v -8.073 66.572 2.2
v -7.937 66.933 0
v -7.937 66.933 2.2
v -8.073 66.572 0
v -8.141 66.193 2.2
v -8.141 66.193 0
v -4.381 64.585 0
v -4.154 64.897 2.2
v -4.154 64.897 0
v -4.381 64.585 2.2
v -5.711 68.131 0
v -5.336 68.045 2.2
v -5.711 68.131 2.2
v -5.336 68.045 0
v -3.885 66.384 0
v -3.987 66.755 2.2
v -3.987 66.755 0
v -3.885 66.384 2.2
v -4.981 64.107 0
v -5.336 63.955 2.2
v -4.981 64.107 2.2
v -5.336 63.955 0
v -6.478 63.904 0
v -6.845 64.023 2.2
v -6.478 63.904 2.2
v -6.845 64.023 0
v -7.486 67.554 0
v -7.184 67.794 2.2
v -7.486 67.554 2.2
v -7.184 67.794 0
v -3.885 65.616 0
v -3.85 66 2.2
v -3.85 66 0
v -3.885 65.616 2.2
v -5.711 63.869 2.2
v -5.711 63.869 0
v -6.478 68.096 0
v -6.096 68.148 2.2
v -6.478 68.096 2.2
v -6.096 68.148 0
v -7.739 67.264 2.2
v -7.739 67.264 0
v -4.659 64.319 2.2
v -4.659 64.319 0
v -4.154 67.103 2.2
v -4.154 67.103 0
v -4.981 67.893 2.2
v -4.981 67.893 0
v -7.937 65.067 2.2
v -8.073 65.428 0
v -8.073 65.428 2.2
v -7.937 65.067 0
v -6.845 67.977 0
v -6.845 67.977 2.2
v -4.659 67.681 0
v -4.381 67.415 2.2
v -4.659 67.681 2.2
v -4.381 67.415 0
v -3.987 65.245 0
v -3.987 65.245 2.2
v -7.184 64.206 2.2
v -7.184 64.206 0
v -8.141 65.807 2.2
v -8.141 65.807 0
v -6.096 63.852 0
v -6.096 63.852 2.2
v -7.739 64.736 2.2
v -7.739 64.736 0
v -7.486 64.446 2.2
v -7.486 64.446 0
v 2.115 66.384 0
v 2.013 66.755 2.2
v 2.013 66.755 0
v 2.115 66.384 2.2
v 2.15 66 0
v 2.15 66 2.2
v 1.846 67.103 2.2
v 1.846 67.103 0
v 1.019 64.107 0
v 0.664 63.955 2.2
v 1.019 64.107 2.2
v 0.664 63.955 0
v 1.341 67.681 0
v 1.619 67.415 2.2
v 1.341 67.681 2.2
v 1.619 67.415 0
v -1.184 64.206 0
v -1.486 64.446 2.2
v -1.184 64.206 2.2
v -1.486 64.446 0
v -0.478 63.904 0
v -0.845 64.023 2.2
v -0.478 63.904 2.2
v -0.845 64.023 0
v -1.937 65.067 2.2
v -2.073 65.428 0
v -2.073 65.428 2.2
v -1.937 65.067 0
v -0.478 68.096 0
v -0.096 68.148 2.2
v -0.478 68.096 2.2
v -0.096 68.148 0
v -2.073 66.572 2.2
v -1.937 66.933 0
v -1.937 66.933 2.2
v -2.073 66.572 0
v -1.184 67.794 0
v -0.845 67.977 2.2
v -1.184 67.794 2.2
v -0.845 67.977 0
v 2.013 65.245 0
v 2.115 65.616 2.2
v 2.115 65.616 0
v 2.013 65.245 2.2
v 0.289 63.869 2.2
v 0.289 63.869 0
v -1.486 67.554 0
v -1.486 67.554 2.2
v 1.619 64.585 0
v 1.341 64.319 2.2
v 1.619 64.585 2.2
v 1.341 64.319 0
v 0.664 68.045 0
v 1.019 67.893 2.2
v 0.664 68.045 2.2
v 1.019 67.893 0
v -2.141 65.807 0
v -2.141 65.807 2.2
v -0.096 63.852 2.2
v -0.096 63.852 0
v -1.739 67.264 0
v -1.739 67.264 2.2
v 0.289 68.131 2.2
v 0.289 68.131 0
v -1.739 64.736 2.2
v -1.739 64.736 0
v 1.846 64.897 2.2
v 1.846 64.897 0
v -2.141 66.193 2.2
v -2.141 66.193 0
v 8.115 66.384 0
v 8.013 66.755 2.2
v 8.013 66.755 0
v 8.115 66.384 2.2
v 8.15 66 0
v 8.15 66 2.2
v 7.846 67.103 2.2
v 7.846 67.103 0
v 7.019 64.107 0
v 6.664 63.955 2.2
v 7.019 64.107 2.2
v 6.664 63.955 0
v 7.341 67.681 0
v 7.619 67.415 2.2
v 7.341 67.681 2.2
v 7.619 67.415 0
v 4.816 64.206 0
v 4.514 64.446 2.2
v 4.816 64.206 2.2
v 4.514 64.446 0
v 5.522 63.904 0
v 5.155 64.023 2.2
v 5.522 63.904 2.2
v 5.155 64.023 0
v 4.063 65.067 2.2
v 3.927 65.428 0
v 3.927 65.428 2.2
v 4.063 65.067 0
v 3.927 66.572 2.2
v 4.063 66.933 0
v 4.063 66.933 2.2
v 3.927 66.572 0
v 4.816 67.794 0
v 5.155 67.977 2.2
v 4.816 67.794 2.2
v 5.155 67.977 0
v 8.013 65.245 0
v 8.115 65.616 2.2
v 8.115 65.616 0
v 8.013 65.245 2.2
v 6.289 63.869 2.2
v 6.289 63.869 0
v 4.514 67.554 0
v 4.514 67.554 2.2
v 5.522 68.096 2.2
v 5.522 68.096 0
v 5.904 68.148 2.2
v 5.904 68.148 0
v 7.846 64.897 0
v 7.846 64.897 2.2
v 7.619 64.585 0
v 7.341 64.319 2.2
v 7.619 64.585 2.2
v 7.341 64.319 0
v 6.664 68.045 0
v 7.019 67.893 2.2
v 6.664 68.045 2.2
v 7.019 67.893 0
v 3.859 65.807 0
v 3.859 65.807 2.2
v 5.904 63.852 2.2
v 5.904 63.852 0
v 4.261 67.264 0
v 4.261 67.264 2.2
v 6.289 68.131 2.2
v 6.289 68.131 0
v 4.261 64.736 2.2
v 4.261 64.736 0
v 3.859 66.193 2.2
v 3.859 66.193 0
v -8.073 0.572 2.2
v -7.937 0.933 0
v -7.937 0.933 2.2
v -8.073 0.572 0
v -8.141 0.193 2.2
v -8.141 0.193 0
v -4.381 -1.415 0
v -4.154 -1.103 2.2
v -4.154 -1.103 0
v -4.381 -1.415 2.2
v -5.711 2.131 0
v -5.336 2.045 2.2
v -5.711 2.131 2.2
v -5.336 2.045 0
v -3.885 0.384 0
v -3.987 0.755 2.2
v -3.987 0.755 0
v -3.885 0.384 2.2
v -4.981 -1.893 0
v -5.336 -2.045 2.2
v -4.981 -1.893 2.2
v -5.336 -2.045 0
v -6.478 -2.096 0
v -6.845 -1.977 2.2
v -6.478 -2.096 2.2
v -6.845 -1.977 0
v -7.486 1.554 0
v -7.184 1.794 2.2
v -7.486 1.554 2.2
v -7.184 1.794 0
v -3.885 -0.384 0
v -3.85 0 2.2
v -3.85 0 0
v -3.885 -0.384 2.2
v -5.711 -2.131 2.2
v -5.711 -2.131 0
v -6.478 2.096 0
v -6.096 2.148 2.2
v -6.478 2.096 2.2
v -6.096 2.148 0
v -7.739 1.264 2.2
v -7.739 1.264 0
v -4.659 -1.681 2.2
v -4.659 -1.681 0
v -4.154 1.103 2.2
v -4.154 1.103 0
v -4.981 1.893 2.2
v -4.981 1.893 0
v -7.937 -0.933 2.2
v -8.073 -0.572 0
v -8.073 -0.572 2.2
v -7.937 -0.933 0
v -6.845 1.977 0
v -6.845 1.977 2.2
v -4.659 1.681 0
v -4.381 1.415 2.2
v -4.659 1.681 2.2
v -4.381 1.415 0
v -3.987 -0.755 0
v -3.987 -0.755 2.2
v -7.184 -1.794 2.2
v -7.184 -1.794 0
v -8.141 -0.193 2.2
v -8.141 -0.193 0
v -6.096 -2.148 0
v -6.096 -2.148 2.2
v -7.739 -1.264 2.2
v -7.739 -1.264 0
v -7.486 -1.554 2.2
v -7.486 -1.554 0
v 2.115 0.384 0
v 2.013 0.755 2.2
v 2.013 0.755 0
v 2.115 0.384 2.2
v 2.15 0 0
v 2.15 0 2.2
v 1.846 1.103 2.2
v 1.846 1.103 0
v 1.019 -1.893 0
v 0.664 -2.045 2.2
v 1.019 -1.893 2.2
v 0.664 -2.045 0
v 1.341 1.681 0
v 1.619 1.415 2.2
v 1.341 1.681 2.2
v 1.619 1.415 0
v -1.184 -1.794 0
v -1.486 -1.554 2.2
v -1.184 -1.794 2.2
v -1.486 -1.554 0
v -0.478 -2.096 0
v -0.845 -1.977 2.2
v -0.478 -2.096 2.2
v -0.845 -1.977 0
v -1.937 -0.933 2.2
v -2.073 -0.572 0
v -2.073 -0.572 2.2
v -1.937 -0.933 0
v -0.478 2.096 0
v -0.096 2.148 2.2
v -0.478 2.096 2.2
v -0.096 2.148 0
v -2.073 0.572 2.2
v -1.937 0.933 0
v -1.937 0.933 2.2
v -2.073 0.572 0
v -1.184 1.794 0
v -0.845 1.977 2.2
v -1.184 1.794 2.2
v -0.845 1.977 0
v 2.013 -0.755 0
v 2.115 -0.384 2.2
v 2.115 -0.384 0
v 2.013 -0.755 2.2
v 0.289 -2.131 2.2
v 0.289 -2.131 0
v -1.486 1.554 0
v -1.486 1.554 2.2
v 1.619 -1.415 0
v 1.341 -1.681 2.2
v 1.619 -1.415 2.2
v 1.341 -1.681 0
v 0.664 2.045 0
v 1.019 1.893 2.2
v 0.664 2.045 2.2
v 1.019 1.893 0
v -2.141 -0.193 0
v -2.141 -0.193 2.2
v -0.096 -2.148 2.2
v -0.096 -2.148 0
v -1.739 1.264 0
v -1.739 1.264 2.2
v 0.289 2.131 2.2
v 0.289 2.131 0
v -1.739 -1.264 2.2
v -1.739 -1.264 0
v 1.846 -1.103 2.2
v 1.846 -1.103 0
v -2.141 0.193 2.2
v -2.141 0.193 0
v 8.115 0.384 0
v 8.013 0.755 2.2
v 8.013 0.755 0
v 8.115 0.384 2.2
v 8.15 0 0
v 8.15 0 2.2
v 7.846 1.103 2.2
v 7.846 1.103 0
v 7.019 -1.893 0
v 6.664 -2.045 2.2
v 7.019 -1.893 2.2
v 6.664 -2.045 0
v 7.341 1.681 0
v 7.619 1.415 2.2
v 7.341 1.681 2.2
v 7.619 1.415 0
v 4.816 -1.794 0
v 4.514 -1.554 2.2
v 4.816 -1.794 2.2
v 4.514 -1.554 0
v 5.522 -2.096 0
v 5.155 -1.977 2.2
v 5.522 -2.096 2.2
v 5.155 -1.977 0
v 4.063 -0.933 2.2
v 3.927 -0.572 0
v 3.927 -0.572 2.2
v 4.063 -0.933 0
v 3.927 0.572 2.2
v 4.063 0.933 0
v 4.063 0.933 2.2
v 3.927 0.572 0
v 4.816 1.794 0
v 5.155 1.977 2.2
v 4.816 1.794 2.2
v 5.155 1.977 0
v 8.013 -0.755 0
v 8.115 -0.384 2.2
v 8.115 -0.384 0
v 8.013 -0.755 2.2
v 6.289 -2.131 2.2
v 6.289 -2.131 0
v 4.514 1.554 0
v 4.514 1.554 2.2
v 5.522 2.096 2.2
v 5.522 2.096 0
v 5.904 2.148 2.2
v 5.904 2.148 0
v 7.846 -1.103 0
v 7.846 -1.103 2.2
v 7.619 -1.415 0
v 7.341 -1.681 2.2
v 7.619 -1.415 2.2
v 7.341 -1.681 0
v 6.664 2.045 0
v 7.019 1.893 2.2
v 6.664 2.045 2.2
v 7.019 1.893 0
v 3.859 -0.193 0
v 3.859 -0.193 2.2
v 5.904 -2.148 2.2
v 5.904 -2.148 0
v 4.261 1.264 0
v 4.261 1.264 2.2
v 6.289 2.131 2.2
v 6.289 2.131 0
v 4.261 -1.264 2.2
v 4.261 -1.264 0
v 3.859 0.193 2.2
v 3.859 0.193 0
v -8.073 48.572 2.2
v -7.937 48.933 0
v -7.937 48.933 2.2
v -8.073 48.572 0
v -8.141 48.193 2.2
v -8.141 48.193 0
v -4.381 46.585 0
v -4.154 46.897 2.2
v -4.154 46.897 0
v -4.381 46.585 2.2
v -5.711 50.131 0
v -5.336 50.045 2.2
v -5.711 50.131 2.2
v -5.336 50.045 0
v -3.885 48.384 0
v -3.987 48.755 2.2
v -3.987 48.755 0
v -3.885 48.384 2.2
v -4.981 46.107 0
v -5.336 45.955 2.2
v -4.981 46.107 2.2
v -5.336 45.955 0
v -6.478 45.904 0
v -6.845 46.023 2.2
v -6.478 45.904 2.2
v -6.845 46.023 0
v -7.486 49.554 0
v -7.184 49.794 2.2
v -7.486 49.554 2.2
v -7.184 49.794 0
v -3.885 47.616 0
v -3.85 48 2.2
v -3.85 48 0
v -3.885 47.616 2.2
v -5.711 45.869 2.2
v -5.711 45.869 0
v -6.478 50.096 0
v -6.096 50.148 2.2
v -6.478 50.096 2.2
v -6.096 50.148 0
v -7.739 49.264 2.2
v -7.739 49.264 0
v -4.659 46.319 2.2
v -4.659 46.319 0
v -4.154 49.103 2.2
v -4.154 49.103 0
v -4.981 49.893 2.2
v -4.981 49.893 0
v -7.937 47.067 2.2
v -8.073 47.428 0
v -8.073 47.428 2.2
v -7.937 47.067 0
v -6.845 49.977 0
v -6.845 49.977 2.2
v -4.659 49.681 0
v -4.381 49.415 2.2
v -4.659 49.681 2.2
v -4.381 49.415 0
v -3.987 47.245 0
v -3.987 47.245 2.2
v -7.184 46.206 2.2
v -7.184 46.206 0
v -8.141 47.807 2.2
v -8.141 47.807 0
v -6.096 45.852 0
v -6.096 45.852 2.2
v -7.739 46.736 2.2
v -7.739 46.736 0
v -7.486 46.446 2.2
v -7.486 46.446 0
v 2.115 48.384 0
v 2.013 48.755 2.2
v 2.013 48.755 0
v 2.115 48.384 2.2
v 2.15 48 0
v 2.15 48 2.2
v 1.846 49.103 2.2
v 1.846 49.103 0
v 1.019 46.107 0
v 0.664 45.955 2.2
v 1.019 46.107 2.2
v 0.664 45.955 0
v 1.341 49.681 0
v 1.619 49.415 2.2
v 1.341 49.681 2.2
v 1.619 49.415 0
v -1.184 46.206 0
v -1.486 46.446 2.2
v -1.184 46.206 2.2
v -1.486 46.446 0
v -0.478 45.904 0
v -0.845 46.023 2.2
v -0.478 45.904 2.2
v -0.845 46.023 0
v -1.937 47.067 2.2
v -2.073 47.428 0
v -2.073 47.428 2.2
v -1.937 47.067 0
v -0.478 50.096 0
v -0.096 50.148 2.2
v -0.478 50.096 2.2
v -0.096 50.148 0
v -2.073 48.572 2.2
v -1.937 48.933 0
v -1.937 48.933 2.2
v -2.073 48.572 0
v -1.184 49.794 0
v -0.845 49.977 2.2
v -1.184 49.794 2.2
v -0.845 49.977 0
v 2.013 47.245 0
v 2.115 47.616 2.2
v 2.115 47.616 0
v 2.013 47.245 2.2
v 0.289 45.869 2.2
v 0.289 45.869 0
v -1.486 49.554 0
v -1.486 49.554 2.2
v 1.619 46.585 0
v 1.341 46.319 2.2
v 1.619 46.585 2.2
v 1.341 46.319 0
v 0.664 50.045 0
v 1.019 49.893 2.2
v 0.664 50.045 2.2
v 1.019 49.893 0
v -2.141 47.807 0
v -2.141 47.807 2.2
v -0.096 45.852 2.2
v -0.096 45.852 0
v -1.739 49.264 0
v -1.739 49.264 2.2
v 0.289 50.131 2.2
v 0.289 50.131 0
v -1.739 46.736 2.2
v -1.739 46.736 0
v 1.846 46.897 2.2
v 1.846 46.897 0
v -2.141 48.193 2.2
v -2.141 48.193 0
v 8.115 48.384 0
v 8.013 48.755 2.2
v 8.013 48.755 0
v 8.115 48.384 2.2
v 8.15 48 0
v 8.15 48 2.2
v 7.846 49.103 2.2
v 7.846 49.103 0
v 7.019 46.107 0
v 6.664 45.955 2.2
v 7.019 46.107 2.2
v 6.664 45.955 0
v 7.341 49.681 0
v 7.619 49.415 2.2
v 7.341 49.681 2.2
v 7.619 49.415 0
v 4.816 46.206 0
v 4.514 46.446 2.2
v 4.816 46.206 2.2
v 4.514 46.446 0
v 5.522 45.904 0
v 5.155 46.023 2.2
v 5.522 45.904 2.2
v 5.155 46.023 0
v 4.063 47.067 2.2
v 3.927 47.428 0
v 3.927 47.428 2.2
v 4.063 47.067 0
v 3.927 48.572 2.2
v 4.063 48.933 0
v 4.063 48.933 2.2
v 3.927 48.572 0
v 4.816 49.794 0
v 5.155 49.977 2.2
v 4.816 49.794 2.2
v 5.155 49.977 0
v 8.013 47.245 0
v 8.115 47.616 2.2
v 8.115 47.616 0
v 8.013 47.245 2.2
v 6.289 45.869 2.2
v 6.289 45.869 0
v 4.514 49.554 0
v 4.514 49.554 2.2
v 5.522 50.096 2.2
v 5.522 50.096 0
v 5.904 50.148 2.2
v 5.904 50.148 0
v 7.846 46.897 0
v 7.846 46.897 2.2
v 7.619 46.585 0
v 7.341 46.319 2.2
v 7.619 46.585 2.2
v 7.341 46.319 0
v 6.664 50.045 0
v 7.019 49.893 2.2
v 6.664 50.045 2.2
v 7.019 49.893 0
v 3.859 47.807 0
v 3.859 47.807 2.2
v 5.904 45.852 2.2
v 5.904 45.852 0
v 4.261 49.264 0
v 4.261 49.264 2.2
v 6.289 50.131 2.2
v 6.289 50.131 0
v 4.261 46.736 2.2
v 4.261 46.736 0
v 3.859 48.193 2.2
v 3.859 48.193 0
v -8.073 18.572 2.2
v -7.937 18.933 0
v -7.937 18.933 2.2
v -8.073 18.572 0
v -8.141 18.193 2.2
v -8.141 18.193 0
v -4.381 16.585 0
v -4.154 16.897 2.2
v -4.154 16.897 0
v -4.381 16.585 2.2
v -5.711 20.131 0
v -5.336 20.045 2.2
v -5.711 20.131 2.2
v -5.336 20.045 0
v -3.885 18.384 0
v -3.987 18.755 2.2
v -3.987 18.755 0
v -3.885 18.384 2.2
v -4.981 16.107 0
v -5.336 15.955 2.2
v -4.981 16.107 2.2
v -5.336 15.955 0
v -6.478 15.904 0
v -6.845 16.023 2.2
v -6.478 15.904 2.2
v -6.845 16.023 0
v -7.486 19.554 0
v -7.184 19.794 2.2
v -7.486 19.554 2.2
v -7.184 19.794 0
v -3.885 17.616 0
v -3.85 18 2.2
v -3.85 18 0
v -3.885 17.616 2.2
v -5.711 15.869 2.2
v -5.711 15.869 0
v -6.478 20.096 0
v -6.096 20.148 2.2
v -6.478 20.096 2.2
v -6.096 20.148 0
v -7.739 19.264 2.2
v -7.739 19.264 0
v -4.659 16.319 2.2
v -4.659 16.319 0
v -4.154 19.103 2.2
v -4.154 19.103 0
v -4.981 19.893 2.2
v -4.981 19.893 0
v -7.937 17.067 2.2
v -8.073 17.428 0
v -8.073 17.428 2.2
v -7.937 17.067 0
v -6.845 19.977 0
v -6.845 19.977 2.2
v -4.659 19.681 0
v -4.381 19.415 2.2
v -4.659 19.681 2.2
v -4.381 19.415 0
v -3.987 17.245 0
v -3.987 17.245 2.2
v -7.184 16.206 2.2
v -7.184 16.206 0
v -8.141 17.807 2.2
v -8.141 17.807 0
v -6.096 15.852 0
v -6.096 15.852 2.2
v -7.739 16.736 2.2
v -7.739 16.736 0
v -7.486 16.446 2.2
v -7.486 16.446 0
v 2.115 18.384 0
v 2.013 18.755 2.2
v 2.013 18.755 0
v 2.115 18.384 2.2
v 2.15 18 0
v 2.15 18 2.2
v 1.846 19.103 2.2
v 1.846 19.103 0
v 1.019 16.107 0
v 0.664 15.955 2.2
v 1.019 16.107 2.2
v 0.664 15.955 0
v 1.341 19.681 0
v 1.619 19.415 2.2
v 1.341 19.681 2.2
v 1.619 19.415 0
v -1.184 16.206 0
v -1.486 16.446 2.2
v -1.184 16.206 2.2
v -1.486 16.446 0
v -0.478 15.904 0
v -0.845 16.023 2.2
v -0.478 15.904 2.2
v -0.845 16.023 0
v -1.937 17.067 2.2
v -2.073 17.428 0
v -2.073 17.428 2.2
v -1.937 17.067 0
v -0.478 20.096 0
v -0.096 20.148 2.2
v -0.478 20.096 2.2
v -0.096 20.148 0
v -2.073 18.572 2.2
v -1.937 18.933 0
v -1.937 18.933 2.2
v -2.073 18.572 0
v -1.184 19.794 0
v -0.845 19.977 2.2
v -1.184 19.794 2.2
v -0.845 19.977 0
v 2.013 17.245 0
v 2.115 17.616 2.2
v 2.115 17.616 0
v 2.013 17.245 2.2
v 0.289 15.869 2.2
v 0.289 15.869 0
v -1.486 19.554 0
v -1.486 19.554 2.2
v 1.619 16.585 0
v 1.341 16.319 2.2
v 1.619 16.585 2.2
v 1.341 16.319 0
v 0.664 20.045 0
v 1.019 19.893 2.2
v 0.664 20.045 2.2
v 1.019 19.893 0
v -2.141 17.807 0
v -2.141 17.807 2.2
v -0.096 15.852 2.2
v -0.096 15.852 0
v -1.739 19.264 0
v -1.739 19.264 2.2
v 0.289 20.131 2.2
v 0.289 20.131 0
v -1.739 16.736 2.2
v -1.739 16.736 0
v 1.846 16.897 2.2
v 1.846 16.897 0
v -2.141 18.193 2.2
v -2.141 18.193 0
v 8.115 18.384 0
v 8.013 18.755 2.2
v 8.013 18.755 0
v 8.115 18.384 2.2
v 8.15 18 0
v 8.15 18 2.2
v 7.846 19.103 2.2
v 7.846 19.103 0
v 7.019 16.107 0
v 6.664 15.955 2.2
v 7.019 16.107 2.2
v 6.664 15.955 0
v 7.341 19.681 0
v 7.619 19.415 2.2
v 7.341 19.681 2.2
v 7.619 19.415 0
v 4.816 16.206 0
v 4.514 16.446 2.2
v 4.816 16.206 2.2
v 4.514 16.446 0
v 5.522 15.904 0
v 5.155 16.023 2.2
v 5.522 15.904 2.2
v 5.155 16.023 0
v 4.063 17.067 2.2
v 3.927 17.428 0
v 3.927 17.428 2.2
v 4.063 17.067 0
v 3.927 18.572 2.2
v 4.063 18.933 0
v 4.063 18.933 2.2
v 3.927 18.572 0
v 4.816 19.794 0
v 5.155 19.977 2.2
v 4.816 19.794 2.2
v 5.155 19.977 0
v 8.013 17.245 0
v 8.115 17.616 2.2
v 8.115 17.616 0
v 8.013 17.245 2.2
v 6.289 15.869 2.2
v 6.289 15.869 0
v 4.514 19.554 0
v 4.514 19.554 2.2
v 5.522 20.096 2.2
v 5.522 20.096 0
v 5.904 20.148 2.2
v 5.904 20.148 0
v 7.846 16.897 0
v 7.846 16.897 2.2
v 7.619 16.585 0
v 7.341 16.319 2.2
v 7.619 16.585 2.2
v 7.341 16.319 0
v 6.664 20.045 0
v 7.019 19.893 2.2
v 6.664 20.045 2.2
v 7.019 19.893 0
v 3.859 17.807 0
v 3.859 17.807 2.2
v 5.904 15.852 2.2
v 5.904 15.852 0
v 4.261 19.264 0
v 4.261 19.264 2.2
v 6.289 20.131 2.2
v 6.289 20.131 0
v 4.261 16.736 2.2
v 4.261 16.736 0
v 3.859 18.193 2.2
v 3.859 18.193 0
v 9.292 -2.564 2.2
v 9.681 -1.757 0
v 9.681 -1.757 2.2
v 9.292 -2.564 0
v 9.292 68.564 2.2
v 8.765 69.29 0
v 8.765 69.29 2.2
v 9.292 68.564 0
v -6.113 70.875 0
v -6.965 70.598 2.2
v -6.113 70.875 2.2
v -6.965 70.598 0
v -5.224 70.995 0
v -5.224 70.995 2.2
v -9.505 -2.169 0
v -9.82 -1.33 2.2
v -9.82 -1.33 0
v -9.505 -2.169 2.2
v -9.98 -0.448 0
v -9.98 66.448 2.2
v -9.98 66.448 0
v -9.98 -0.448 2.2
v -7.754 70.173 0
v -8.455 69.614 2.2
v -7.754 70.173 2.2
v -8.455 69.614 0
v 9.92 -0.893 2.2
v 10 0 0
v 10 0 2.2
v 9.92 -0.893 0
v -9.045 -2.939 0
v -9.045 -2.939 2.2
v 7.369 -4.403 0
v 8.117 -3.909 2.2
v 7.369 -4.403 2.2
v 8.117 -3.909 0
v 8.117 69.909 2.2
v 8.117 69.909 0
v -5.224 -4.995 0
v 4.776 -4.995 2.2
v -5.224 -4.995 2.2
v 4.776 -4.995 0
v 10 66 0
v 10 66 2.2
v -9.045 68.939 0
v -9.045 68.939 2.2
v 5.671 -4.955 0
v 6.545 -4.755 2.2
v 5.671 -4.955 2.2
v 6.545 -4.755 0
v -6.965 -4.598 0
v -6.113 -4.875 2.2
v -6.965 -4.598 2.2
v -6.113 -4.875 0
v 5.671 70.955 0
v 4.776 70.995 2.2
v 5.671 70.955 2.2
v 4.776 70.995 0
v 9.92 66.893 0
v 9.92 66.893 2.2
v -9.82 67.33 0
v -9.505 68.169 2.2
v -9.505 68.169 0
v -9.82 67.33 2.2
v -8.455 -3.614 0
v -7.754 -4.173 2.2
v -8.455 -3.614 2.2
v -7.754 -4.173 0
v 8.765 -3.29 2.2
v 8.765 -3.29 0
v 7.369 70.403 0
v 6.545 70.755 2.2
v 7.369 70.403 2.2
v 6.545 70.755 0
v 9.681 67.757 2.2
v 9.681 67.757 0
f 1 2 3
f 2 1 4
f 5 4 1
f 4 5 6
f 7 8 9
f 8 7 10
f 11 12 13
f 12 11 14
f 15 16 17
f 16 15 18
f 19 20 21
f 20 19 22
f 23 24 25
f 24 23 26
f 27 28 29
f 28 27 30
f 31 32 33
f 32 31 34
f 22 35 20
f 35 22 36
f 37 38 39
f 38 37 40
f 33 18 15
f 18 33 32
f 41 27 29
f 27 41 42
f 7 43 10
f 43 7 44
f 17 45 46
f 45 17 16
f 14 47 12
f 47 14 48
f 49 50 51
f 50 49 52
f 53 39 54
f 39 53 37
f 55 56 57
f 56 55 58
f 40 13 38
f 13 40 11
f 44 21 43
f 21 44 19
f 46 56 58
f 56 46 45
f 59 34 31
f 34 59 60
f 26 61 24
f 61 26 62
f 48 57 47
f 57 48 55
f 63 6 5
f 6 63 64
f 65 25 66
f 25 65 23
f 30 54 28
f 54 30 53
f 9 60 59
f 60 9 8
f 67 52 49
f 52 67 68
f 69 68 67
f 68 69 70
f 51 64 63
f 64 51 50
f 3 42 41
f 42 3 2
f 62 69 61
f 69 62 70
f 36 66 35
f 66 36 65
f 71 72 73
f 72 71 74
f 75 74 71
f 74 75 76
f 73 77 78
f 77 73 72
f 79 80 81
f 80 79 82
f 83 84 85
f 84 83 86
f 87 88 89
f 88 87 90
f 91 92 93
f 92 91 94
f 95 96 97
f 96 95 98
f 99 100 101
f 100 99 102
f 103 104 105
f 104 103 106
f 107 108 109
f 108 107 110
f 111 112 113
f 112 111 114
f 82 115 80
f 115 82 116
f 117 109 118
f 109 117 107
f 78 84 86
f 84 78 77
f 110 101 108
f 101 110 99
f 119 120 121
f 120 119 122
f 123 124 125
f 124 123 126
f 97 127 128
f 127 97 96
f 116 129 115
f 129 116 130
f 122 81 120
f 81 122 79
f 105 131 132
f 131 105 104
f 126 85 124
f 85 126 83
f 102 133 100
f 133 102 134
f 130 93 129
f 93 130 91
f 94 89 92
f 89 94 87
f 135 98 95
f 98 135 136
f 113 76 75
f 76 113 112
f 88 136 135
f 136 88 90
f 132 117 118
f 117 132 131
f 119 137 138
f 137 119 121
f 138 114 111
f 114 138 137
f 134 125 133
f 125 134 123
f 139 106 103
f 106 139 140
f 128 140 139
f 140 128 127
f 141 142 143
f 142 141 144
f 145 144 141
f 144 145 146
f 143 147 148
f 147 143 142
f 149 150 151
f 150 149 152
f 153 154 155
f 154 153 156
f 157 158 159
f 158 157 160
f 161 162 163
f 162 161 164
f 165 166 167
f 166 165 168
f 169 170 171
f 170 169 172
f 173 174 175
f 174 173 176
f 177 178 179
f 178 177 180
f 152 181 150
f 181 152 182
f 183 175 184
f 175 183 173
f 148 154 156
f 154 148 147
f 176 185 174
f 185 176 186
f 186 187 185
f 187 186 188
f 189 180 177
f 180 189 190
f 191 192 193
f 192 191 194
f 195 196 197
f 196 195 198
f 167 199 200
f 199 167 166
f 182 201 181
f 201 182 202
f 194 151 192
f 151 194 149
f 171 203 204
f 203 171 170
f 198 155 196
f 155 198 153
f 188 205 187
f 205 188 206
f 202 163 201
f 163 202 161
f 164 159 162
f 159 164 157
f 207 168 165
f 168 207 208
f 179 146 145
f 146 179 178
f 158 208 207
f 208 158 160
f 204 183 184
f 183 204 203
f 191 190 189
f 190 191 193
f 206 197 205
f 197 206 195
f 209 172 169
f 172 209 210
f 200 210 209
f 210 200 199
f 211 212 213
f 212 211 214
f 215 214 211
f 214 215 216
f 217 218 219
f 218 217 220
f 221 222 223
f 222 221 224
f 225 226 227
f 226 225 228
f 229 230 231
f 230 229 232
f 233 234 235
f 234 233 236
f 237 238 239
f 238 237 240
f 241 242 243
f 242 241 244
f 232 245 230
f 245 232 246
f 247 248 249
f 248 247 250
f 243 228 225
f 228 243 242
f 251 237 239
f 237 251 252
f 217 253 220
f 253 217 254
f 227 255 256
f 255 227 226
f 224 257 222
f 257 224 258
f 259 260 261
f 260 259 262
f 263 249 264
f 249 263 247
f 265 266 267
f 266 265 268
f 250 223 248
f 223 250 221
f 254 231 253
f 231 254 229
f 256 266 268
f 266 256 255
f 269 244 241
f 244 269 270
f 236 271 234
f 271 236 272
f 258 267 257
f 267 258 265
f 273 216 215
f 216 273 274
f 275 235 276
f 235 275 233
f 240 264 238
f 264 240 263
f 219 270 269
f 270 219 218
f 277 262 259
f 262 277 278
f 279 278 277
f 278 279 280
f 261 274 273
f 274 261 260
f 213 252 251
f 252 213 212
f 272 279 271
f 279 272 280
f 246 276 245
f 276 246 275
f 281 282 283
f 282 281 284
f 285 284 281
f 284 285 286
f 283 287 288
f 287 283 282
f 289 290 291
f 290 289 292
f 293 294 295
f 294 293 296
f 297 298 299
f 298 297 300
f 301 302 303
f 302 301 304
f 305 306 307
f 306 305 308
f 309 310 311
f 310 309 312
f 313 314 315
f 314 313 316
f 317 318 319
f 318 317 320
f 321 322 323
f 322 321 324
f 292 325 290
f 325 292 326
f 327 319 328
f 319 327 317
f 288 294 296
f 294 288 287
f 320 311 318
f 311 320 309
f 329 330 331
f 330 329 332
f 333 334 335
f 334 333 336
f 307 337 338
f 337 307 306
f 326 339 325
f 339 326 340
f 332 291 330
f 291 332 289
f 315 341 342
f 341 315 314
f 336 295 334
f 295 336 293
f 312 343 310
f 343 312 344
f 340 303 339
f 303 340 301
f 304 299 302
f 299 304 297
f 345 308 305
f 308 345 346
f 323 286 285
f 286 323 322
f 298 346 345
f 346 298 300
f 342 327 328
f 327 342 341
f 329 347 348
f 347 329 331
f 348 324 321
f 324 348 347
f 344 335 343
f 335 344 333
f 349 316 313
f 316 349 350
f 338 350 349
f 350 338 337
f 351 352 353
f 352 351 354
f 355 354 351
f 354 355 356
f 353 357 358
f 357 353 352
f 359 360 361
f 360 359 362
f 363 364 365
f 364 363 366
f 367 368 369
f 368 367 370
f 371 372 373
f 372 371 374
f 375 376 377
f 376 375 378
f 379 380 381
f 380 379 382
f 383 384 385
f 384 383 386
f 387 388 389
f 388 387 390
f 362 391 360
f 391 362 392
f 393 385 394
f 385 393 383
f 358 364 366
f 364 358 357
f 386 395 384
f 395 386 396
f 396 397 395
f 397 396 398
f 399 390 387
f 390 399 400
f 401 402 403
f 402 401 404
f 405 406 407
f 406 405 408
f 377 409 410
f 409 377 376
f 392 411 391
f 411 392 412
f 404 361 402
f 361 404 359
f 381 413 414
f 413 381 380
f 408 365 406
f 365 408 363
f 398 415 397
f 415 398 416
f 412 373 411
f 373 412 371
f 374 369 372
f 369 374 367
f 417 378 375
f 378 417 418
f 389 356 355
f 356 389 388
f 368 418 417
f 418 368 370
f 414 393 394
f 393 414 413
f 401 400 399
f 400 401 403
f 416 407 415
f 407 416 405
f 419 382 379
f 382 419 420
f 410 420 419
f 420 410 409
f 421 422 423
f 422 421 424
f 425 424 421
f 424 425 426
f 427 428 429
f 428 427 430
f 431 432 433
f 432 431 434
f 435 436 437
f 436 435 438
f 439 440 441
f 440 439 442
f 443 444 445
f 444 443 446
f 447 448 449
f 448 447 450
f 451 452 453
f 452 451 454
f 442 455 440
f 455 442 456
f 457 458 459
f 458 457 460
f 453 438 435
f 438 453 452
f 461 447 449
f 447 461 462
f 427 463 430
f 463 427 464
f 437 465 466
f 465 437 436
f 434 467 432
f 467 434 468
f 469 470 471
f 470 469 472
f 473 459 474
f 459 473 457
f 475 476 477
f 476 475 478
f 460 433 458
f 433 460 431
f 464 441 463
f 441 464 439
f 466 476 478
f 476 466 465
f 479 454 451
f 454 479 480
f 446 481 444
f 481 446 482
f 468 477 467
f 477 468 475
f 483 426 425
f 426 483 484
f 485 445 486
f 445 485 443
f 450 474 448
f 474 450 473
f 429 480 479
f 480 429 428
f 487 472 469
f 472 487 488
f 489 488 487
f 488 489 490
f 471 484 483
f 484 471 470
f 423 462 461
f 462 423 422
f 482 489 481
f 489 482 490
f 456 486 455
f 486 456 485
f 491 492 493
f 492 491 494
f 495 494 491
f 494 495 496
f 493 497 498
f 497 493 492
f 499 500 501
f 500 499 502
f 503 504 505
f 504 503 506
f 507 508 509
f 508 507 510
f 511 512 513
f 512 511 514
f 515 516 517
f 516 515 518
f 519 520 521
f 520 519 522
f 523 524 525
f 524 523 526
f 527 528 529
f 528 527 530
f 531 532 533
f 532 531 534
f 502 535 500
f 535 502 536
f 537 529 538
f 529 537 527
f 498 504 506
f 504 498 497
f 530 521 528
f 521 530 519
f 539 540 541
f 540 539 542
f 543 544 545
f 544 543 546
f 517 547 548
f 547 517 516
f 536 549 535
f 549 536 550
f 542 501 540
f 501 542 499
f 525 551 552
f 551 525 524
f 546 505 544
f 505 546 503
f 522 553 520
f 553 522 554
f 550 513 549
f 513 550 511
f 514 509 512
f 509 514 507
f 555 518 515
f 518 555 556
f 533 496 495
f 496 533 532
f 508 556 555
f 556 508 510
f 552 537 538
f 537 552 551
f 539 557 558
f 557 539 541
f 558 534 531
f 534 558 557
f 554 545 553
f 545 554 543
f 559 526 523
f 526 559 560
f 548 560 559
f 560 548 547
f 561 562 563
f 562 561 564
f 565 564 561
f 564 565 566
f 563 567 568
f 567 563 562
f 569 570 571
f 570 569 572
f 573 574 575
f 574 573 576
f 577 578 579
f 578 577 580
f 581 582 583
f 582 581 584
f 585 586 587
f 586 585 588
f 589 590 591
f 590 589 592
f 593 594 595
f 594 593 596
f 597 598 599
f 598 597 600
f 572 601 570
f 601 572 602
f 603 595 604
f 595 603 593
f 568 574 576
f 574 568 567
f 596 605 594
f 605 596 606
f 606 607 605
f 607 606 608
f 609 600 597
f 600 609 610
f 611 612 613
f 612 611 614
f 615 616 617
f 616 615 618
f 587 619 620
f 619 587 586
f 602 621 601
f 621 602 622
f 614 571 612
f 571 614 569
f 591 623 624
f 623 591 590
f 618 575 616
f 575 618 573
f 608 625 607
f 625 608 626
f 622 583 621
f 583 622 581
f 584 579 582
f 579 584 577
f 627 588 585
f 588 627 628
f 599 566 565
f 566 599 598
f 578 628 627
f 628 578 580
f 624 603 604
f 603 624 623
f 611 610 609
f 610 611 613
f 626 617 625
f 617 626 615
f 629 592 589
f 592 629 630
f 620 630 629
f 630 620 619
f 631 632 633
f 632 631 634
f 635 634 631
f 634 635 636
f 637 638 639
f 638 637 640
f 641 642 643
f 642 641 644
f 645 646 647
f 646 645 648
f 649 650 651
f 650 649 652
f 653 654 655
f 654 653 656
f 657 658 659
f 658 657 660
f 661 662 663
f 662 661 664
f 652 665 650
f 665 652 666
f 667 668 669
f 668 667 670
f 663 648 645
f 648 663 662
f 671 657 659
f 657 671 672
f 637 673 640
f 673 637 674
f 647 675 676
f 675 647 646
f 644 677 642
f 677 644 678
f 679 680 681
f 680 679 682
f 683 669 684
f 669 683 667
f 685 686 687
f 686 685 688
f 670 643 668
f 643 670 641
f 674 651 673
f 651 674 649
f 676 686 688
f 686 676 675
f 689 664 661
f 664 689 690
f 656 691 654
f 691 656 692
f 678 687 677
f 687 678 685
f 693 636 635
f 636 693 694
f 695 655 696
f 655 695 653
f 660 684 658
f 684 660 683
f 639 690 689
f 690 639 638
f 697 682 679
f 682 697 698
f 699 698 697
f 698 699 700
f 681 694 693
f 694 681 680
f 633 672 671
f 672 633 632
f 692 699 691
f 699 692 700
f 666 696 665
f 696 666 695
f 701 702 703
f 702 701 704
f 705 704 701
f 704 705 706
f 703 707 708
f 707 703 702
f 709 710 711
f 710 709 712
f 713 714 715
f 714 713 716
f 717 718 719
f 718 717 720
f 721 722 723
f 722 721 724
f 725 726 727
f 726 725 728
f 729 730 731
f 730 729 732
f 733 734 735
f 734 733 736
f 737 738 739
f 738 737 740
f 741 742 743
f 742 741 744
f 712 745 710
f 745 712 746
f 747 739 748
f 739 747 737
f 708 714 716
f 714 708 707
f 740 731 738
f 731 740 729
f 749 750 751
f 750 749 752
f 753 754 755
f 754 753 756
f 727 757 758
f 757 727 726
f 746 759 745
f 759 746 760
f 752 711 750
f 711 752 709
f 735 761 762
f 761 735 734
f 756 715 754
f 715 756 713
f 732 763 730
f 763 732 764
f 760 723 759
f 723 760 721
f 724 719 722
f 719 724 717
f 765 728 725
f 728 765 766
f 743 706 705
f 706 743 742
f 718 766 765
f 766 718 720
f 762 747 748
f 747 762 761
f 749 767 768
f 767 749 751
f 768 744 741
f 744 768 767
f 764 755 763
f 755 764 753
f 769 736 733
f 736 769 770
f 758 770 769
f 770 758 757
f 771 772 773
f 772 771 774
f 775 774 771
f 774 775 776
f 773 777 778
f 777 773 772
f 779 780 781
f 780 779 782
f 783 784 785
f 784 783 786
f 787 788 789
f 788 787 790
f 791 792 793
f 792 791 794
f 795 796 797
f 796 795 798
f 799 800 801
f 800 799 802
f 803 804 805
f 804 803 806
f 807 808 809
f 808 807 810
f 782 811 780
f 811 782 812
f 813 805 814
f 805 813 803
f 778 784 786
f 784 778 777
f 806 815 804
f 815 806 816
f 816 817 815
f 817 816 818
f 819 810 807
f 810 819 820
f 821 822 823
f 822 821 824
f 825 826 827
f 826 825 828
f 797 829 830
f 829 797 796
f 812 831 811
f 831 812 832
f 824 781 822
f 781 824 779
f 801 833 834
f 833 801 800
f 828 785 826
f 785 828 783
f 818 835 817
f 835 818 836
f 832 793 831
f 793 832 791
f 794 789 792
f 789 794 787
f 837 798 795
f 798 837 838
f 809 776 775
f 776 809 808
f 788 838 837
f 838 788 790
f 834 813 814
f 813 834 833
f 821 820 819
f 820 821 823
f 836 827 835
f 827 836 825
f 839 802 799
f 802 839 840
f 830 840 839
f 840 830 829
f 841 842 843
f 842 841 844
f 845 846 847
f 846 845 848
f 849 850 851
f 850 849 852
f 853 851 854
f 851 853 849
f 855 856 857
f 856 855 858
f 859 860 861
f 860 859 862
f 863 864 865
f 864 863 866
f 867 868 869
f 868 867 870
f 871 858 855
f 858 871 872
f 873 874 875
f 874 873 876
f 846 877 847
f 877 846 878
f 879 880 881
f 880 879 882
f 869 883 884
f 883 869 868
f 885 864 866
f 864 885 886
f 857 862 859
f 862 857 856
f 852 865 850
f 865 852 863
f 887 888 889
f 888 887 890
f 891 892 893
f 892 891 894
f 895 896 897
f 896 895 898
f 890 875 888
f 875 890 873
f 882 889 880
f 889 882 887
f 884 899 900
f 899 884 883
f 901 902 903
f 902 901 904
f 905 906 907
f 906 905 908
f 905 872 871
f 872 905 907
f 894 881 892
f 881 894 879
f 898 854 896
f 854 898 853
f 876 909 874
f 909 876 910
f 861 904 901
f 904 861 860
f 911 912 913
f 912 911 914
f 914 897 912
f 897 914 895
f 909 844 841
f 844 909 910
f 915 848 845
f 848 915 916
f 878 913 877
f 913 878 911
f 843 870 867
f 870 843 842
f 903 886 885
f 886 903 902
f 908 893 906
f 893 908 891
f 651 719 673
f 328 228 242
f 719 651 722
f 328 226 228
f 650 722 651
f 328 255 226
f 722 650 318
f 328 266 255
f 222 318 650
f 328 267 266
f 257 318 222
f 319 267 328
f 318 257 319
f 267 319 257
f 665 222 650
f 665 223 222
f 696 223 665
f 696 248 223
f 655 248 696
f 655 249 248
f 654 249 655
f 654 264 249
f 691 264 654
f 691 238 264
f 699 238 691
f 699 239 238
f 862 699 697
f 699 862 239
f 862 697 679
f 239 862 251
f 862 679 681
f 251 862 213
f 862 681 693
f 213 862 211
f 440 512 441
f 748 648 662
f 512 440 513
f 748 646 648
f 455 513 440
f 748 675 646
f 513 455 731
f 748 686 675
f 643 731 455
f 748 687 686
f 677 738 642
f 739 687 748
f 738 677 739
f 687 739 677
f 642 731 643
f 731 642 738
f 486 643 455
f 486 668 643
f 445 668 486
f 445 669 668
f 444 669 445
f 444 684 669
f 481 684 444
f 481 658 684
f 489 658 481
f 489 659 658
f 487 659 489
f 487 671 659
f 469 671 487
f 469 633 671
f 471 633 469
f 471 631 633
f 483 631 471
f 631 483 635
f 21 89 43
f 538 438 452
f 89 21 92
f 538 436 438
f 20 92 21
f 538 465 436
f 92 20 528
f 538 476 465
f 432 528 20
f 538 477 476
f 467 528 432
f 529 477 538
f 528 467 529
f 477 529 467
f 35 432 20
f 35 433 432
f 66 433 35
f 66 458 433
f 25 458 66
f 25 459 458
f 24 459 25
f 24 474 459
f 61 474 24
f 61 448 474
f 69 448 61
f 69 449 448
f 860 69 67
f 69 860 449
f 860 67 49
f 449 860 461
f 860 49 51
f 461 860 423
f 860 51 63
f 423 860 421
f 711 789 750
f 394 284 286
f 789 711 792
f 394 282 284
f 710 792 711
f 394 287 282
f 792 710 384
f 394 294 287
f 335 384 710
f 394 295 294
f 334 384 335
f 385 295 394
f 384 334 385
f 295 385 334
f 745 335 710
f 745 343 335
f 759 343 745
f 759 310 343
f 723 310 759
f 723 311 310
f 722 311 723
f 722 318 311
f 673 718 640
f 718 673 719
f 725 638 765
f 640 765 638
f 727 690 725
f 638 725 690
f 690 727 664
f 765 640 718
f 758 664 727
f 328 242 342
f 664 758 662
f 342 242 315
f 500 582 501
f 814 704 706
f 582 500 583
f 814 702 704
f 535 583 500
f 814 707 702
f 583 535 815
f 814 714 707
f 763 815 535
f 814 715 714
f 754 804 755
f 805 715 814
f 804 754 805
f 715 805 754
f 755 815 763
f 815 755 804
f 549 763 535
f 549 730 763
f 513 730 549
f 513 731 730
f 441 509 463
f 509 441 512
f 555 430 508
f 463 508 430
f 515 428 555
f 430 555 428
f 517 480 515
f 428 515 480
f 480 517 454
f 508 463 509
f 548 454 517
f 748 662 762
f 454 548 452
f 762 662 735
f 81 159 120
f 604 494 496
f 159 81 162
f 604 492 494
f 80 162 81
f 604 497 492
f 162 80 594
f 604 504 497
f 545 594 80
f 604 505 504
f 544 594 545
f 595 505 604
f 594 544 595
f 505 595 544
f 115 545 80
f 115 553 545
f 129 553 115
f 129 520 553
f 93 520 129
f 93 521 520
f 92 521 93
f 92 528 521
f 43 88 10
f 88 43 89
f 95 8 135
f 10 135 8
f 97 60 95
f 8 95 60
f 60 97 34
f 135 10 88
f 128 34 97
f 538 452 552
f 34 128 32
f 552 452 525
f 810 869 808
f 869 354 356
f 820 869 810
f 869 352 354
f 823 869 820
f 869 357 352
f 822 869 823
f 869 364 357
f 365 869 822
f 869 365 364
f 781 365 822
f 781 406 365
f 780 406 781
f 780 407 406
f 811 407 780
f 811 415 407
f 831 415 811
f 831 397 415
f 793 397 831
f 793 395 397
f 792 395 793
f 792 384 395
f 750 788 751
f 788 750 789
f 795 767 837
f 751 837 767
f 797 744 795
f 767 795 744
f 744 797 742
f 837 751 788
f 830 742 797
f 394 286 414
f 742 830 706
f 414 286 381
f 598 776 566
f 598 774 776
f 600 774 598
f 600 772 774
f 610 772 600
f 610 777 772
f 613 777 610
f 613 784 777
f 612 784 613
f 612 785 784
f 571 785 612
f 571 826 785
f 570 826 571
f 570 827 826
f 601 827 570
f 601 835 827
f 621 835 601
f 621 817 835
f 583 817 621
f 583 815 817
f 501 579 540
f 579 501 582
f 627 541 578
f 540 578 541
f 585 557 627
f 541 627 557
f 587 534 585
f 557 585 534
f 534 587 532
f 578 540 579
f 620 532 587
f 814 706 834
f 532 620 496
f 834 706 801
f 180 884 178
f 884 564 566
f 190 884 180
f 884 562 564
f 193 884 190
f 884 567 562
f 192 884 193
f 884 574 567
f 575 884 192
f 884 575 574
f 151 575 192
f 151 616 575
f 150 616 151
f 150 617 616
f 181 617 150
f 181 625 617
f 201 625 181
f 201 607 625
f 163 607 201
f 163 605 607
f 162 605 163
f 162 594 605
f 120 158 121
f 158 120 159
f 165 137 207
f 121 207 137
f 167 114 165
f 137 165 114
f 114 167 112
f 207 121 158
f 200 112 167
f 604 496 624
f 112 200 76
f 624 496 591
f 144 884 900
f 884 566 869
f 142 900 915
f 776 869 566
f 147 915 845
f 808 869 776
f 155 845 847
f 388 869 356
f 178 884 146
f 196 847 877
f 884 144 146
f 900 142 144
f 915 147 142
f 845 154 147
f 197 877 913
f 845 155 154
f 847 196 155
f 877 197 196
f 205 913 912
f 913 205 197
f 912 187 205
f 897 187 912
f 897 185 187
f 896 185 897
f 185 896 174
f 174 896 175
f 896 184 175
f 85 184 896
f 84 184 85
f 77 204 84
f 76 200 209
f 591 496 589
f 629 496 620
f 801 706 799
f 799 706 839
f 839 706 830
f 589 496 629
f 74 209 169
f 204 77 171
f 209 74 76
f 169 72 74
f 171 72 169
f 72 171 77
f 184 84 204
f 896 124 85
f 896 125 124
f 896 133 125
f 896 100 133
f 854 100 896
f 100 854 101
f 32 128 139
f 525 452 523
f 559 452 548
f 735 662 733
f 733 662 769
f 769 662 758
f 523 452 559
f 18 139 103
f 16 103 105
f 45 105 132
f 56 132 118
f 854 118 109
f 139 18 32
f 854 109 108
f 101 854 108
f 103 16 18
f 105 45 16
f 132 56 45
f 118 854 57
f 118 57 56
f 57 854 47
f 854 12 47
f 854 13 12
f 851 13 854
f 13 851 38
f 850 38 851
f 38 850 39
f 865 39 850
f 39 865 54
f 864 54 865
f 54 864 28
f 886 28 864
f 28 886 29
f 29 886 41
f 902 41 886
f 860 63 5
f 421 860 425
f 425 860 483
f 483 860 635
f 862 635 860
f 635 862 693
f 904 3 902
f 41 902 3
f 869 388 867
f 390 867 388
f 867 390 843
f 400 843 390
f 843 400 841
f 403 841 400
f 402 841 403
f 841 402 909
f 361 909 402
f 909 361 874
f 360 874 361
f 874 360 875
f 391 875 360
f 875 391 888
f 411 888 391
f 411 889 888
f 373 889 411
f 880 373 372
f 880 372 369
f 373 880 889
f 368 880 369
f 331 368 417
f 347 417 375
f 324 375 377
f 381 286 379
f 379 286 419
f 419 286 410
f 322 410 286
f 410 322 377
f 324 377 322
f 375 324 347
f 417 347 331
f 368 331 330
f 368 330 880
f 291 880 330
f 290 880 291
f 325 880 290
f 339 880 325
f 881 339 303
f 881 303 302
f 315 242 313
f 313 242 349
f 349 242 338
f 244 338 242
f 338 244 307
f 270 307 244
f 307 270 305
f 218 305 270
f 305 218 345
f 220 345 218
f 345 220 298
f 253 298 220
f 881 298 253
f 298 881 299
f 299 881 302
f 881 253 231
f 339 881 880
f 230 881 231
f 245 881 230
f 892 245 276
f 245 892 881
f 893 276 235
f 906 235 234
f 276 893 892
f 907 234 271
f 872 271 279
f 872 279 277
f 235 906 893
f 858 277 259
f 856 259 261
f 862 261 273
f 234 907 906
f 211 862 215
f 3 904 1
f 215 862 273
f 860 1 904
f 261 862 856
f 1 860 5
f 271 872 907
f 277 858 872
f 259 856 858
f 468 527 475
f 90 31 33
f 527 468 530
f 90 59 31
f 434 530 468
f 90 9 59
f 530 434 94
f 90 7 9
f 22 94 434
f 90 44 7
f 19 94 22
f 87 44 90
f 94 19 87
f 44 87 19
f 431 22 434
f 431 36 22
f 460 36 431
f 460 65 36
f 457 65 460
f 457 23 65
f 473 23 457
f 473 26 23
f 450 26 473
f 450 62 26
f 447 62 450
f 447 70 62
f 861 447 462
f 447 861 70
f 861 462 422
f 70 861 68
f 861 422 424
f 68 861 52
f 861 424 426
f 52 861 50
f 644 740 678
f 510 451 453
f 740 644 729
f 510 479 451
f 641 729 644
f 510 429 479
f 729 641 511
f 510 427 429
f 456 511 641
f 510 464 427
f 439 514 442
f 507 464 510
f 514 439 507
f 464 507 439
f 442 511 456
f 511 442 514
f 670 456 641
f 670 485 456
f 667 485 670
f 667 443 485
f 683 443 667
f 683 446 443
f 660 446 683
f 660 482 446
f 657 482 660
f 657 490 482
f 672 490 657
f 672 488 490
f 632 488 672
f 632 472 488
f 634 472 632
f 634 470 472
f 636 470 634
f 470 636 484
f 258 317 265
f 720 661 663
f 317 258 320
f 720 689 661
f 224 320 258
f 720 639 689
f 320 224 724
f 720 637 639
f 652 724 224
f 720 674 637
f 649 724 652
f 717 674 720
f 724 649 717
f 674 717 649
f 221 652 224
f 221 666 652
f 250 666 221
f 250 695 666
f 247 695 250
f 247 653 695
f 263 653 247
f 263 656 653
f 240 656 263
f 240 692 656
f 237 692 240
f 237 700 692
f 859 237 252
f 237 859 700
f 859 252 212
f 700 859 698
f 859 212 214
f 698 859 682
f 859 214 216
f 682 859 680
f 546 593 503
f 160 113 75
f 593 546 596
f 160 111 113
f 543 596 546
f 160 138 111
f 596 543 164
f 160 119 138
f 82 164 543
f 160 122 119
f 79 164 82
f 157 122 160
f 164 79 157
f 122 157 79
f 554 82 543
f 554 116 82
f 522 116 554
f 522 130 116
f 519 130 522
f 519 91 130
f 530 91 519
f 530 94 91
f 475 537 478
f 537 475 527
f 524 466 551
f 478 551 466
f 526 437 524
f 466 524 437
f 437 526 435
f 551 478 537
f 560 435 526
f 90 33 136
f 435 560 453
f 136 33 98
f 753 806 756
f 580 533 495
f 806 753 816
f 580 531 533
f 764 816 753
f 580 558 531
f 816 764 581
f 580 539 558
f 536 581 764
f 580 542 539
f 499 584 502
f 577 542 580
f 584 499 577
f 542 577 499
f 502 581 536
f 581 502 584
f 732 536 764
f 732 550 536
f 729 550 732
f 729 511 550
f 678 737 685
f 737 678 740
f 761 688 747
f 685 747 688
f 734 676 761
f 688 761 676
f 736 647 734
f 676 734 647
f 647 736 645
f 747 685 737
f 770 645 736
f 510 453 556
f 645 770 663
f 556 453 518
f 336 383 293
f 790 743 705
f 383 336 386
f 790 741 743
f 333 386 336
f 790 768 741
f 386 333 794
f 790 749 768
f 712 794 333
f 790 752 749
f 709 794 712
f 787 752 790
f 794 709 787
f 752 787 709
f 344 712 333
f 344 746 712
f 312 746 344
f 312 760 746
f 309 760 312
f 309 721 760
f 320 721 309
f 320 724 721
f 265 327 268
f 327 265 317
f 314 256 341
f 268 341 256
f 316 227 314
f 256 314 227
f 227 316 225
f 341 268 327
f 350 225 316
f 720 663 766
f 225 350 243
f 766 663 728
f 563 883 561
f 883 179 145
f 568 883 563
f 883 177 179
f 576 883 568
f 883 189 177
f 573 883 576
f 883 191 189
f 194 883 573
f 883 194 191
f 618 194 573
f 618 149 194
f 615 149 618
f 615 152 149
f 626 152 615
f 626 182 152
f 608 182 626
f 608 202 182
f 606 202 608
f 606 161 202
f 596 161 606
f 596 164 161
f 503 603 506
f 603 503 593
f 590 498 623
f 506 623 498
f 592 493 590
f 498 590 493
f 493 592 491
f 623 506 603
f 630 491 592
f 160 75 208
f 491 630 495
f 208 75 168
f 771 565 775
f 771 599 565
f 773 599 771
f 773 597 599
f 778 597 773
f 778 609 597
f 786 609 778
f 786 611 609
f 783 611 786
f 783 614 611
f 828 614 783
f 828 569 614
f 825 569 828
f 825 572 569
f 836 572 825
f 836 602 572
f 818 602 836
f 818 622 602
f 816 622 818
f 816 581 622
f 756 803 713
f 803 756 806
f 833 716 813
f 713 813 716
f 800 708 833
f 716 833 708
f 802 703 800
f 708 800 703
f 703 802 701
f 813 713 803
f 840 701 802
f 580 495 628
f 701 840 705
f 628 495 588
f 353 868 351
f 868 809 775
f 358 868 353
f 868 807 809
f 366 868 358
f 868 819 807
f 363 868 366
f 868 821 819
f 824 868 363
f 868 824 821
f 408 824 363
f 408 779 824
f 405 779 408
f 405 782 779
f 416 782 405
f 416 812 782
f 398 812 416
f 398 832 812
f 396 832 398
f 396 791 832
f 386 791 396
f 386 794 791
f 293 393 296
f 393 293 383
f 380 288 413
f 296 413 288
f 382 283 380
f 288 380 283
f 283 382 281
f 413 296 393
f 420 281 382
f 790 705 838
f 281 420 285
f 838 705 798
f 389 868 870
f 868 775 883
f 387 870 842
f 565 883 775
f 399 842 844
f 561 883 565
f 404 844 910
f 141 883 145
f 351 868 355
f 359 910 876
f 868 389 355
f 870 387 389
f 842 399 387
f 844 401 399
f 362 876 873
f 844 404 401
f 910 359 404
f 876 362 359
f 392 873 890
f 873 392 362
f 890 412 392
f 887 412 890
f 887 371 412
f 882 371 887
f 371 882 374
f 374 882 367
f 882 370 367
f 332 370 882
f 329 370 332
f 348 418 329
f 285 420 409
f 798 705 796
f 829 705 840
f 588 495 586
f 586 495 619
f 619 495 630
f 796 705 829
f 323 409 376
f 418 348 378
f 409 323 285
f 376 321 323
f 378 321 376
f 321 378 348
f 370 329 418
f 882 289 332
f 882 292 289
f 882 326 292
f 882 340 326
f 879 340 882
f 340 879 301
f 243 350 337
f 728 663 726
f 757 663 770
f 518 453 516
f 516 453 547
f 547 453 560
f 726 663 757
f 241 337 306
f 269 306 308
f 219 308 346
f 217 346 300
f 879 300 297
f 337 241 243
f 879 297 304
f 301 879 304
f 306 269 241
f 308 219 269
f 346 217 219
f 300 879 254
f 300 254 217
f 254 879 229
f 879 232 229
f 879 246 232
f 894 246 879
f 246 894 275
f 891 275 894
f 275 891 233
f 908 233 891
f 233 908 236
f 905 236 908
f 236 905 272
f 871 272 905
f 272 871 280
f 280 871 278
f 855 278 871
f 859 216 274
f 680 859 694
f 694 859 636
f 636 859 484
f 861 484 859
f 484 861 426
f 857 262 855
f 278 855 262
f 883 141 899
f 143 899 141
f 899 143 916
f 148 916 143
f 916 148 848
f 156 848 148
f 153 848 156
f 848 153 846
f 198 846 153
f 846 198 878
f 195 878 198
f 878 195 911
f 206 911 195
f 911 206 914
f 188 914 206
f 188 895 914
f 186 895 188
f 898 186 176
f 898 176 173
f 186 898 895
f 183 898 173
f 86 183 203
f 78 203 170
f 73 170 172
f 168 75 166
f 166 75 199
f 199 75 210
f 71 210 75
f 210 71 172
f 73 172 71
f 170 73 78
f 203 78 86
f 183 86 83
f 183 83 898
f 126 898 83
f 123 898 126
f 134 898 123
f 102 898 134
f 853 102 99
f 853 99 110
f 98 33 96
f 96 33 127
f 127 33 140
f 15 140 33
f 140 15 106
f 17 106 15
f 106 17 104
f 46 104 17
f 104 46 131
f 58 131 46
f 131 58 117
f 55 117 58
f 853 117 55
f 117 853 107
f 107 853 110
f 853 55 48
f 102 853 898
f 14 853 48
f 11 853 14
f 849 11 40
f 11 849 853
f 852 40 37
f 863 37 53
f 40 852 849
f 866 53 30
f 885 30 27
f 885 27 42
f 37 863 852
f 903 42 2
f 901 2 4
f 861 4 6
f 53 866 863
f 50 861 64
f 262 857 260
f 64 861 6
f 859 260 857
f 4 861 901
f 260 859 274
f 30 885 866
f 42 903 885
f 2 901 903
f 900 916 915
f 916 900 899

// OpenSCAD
// file: ../common.scad
// Width of plastic
Width = 2.2;

// Color of the parts
PartsColor = [0.8, 0.8, 0.8];

// Diameter of plastic ollo holes
OlloHoles = 4.3;

// Width of Ollo "real" plastic
OlloWidth = 3;

// Sizes of the parts of the leg
LegSizeA = 50;
LegSizeB = 20;
LegSizeC = 22;

// Width of the bottom part of the leg
LegSizeBottom = 8;

// Size of the "top" part of the legs, in mm
LegSizeTop = 22;

// Motor dimensions
MotorWidth = 24;
MotorHeight = 36;
MotorDepth = 24;
MotorArmOffset = 9;

// U dimensions
UHeight = 10;
URadius = 8;
UWidth = 30+Width/2;
UTotalHeight = UHeight+URadius;

// Side dimensions
SideSize = 38 + 0;
SideHolesToBorder = 5;

// Size of the body
BodySize = 18;

// Defining the resolution
$fn=35;

// Do an Ollo hole on the part
module olloHole(depth=Width)
{
    translate([0,0,-0.1])
      cylinder(depth+0.2, OlloHoles/2, OlloHoles/2);
}

// Do 3 ollo holes
module threeOllo(depth=Width)
{
  for (xy=[[-6,0],[0,0],[6,0]]) {
    translate([xy[0], xy[1], 0])
    olloHole(depth);
  }
}

// Do a servo arm holes
module servoArm(depth=Width)
{
    threeOllo(depth);
    rotate([0,0,90])
      threeOllo(depth);
}

// Do a rounded cube
module rounded(x=10, y=10, z=10, r=3, center=false) {
  if (center) {
    translate([-(x/2),-(y/2),0])
      rounded(x, y, z, r);
  } else {
    translate([r,r,0])
    minkowski() {
      cube([x-2*r,y-2*r,z/2]);
      cylinder(h=z/2, r=r);
    }
  }
}
// main file
include <../common.scad>;

module side() {
    translate([0,SideSize-SideHolesToBorder,0]) {
        color(PartsColor) {
            difference() {
                rounded(20, SideSize*2, Width, 5, true);
                for (y=[SideSize-SideHolesToBorder,	 -SideSize+SideHolesToBorder,
                        SideSize-SideHolesToBorder-18, -SideSize+SideHolesToBorder+18]) {
                    translate([0, y, 0])
                        threeOllo();
                }
            }
        }
    }
}

side();
